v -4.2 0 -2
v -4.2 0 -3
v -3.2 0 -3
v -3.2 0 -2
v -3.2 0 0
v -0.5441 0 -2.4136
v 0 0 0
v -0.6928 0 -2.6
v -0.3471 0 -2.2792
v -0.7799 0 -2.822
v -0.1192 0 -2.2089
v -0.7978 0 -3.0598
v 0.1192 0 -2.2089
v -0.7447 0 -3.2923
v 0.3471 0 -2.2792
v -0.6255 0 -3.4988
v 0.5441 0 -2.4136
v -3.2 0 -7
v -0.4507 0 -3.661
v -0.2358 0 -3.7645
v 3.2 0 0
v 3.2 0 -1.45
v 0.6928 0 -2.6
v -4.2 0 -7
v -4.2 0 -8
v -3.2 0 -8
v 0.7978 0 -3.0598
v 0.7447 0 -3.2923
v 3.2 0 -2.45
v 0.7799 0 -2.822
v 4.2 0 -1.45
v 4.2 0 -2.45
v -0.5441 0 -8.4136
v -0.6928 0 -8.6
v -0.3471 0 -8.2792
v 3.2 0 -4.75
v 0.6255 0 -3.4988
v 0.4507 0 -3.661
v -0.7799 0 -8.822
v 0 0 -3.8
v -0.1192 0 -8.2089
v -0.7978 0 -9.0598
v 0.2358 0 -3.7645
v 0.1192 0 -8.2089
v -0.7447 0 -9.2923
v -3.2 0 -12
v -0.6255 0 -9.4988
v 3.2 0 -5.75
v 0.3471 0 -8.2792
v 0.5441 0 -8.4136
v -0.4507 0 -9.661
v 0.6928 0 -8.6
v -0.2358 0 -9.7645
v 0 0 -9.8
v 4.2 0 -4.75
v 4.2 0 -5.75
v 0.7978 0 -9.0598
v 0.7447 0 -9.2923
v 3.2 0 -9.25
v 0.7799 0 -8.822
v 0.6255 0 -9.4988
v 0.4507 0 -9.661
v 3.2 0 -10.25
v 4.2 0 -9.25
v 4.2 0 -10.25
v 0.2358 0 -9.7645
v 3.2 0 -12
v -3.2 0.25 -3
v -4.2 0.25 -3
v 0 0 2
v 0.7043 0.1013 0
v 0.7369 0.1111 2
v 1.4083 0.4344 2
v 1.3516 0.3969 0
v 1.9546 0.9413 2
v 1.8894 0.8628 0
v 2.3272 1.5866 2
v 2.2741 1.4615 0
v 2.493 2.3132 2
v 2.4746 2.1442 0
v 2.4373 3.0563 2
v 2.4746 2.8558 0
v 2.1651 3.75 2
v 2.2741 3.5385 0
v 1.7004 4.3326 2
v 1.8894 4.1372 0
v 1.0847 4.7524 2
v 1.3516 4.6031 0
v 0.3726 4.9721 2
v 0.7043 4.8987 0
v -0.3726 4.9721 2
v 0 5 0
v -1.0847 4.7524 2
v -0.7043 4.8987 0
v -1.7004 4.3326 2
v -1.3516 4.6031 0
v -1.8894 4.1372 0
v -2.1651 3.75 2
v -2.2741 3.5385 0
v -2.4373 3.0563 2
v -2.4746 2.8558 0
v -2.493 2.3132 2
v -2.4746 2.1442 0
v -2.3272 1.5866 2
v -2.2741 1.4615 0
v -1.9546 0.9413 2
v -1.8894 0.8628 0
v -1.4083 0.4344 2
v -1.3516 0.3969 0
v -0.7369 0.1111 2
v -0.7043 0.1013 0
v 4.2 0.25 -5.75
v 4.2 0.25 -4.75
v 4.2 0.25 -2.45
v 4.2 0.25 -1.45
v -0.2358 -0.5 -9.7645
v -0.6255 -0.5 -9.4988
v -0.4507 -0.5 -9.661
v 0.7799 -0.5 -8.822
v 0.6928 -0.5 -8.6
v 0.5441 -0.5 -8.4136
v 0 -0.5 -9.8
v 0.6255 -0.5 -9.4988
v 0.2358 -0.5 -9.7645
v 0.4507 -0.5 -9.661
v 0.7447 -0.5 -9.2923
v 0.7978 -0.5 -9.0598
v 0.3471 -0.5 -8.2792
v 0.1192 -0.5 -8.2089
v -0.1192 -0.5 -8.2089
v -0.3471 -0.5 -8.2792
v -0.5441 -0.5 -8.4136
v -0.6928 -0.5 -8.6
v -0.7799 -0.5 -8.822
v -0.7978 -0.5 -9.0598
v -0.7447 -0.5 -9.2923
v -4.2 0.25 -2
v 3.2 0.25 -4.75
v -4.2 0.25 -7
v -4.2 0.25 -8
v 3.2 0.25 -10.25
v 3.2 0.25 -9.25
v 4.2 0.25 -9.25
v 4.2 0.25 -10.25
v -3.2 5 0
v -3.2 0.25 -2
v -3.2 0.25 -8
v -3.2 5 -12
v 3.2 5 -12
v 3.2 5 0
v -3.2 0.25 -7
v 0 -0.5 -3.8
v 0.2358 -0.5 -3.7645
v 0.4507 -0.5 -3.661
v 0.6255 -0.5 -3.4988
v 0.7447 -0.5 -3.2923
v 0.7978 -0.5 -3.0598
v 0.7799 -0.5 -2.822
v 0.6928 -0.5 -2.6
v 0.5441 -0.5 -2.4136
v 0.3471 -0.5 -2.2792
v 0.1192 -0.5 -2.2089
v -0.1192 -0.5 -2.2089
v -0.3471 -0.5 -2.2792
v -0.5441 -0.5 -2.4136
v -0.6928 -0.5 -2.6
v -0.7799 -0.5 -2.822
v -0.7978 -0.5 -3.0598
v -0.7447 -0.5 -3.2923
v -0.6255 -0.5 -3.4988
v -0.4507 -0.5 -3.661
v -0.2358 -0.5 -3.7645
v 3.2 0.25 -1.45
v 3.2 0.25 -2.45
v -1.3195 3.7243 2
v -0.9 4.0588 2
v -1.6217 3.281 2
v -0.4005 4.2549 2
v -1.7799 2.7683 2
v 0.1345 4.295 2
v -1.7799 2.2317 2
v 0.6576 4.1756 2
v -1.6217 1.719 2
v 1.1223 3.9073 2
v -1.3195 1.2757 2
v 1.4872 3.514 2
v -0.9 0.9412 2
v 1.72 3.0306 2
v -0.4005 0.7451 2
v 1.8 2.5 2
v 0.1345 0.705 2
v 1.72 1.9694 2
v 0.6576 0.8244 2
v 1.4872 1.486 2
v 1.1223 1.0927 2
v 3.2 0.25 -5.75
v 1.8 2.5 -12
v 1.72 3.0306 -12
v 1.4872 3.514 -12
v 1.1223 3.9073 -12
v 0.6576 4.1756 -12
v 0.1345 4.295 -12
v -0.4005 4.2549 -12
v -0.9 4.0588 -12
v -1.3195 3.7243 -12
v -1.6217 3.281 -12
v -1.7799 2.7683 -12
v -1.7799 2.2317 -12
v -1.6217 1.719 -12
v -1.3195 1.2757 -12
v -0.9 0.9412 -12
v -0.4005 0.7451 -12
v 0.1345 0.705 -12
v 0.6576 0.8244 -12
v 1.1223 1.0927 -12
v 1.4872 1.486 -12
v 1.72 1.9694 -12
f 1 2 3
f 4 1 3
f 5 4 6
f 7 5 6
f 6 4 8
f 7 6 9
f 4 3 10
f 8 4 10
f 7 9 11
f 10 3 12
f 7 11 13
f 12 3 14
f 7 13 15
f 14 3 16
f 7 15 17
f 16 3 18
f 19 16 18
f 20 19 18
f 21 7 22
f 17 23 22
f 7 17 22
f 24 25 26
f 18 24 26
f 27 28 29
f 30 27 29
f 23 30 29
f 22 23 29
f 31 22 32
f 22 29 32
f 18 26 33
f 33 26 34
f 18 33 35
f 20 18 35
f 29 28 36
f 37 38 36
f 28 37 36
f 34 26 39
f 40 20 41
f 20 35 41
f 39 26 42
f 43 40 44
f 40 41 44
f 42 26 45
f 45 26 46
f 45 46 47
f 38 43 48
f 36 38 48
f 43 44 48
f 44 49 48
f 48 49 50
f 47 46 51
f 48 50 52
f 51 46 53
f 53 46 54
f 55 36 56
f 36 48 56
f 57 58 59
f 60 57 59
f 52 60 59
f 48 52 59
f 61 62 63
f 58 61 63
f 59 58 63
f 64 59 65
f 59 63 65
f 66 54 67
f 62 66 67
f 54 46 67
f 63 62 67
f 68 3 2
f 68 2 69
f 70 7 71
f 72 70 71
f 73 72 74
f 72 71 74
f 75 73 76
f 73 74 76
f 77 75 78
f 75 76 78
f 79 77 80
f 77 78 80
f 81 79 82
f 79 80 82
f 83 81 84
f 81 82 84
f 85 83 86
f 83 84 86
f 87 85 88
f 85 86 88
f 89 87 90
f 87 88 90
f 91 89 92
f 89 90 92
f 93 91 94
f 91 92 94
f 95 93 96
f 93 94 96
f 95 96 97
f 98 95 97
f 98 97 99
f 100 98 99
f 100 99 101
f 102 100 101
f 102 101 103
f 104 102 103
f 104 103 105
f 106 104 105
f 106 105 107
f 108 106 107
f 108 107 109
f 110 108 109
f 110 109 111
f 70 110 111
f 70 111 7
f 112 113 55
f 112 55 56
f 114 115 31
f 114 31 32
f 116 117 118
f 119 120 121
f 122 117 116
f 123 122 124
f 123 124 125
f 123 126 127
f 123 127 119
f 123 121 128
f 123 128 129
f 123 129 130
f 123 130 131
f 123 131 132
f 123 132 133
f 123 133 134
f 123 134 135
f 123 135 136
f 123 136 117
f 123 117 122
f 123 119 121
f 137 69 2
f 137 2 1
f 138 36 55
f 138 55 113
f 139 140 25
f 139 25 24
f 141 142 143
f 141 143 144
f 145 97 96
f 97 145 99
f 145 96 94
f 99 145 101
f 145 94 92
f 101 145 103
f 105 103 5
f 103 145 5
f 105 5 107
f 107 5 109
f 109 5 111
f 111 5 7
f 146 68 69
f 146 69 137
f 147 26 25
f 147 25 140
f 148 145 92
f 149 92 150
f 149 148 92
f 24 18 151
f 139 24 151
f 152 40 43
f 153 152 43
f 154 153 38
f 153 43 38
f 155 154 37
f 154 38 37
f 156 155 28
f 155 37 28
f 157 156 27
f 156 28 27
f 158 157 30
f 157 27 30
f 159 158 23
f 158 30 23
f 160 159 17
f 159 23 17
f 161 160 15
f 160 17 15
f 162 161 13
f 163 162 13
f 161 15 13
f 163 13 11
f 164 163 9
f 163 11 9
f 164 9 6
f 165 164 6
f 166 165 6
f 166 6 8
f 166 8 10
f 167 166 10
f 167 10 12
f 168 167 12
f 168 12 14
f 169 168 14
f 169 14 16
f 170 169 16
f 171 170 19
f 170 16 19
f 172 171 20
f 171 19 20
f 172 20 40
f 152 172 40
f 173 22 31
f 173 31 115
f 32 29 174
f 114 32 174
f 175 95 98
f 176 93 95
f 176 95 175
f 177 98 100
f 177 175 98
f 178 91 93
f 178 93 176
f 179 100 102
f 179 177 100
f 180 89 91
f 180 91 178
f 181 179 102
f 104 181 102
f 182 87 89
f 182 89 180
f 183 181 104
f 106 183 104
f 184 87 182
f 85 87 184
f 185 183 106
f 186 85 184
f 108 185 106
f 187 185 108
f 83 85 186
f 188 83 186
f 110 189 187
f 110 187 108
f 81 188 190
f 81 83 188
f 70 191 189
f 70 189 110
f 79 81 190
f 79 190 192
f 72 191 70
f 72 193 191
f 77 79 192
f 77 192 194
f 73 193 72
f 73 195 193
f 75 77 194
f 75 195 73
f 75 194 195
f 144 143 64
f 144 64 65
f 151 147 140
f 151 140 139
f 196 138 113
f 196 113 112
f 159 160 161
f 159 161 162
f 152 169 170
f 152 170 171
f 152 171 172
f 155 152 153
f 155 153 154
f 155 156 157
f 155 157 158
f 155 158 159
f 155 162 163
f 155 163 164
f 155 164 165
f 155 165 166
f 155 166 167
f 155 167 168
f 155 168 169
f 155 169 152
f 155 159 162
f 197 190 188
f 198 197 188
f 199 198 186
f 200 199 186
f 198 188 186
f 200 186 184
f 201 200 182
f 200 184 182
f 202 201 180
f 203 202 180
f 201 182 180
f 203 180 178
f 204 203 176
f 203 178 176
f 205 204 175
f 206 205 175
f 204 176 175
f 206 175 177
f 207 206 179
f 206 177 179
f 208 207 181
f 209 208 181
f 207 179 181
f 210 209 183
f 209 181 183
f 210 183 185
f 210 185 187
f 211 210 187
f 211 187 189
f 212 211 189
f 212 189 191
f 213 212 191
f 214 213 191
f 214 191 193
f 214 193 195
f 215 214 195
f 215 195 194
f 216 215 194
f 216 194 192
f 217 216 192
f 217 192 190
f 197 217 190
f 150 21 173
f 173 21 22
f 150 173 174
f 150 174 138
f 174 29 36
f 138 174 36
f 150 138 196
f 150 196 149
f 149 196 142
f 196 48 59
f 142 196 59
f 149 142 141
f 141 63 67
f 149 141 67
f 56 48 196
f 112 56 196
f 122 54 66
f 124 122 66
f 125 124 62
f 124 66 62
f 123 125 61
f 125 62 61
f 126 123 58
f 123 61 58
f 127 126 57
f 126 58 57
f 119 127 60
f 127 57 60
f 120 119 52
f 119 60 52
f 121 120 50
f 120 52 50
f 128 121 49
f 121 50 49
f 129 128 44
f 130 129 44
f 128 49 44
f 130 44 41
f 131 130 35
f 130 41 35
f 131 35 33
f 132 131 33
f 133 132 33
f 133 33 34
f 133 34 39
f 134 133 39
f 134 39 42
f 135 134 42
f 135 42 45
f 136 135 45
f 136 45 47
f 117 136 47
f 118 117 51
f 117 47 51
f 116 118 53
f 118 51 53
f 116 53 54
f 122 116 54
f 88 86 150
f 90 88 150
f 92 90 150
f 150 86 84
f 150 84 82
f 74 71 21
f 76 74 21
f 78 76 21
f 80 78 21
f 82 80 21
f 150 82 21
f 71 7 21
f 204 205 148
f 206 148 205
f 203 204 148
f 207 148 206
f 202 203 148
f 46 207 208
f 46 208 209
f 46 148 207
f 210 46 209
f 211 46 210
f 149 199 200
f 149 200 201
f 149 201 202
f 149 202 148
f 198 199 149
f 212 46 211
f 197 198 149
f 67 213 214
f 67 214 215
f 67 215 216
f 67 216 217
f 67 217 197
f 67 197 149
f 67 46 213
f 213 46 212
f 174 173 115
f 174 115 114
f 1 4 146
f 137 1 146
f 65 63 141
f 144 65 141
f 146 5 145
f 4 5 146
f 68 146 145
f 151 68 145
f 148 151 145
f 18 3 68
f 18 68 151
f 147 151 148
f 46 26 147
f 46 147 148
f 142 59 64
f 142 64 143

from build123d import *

# Parameters (mm, degrees)
SKETCH_1_W          = 6.4
SKETCH_1_H          = 12
EXTRUDE_1_DEPTH     = 5
SKETCH_2_R          = 2.5
EXTRUDE_2_DEPTH     = 2
SKETCH_3_R          = 0.8
EXTRUDE_3_DEPTH     = 0.5
SKETCH_4_W          = 1
SKETCH_4_H          = 0.25
EXTRUDE_4_DEPTH     = 1
SKETCH_5_R          = 1.8
CUT_EXTRUDE_1_DEPTH = 16.447977214
SKETCH_6_W          = 1
SKETCH_6_H          = 0.25
EXTRUDE_5_DEPTH     = 1


with BuildPart() as part:
    # 草图1 → 凸台-拉伸1 (new body)
    with BuildSketch(Plane(origin=(0, 0, 0), x_dir=(1, 0, 0), z_dir=(0, 1, 0))):
        with Locations((0, 6)):
            Rectangle(SKETCH_1_W, SKETCH_1_H)
    extrude(amount=EXTRUDE_1_DEPTH)

    # 草图2 → 凸台-拉伸2 (add)
    with BuildSketch(Plane.XY):
        with Locations(Location((0, 2.5, 0), (0, 0, 270))):
            Circle(SKETCH_2_R)
    extrude(amount=EXTRUDE_2_DEPTH)

    # 草图3 → 凸台-拉伸3 (add)
    with BuildSketch(Plane.XZ):
        with Locations(Location((0, -3, 0), (0, 0, 270))):
            Circle(SKETCH_3_R)
        with Locations(Location((0, -9, 0), (0, 0, 270))):
            Circle(SKETCH_3_R)
    extrude(amount=EXTRUDE_3_DEPTH)

    # 草图4 → 凸台-拉伸4 (add)
    with BuildSketch(Plane(origin=(3.2, 0, 0), x_dir=(0, 0, -1), z_dir=(1, 0, 0))):
        with Locations((1.95, 0.125)):
            Rectangle(SKETCH_4_W, SKETCH_4_H)
        with Locations((5.25, 0.125)):
            Rectangle(SKETCH_4_W, SKETCH_4_H)
        with Locations((9.75, 0.125)):
            Rectangle(SKETCH_4_W, SKETCH_4_H)
    extrude(amount=EXTRUDE_4_DEPTH)

    # 草图5 → 切除-拉伸1 (cut, through all)
    with BuildSketch(Plane.XY.offset(2)):
        with Locations((0, 2.5)):
            Circle(SKETCH_5_R)
    extrude(amount=-CUT_EXTRUDE_1_DEPTH, mode=Mode.SUBTRACT)

    # 草图6 → 凸台-拉伸5 (add)
    with BuildSketch(Plane.ZY.offset(3.2)):
        with Locations((-2.5, 0.125)):
            Rectangle(SKETCH_6_W, SKETCH_6_H)
        with Locations((-7.5, 0.125)):
            Rectangle(SKETCH_6_W, SKETCH_6_H)
    extrude(amount=EXTRUDE_5_DEPTH)


solid = part.part
